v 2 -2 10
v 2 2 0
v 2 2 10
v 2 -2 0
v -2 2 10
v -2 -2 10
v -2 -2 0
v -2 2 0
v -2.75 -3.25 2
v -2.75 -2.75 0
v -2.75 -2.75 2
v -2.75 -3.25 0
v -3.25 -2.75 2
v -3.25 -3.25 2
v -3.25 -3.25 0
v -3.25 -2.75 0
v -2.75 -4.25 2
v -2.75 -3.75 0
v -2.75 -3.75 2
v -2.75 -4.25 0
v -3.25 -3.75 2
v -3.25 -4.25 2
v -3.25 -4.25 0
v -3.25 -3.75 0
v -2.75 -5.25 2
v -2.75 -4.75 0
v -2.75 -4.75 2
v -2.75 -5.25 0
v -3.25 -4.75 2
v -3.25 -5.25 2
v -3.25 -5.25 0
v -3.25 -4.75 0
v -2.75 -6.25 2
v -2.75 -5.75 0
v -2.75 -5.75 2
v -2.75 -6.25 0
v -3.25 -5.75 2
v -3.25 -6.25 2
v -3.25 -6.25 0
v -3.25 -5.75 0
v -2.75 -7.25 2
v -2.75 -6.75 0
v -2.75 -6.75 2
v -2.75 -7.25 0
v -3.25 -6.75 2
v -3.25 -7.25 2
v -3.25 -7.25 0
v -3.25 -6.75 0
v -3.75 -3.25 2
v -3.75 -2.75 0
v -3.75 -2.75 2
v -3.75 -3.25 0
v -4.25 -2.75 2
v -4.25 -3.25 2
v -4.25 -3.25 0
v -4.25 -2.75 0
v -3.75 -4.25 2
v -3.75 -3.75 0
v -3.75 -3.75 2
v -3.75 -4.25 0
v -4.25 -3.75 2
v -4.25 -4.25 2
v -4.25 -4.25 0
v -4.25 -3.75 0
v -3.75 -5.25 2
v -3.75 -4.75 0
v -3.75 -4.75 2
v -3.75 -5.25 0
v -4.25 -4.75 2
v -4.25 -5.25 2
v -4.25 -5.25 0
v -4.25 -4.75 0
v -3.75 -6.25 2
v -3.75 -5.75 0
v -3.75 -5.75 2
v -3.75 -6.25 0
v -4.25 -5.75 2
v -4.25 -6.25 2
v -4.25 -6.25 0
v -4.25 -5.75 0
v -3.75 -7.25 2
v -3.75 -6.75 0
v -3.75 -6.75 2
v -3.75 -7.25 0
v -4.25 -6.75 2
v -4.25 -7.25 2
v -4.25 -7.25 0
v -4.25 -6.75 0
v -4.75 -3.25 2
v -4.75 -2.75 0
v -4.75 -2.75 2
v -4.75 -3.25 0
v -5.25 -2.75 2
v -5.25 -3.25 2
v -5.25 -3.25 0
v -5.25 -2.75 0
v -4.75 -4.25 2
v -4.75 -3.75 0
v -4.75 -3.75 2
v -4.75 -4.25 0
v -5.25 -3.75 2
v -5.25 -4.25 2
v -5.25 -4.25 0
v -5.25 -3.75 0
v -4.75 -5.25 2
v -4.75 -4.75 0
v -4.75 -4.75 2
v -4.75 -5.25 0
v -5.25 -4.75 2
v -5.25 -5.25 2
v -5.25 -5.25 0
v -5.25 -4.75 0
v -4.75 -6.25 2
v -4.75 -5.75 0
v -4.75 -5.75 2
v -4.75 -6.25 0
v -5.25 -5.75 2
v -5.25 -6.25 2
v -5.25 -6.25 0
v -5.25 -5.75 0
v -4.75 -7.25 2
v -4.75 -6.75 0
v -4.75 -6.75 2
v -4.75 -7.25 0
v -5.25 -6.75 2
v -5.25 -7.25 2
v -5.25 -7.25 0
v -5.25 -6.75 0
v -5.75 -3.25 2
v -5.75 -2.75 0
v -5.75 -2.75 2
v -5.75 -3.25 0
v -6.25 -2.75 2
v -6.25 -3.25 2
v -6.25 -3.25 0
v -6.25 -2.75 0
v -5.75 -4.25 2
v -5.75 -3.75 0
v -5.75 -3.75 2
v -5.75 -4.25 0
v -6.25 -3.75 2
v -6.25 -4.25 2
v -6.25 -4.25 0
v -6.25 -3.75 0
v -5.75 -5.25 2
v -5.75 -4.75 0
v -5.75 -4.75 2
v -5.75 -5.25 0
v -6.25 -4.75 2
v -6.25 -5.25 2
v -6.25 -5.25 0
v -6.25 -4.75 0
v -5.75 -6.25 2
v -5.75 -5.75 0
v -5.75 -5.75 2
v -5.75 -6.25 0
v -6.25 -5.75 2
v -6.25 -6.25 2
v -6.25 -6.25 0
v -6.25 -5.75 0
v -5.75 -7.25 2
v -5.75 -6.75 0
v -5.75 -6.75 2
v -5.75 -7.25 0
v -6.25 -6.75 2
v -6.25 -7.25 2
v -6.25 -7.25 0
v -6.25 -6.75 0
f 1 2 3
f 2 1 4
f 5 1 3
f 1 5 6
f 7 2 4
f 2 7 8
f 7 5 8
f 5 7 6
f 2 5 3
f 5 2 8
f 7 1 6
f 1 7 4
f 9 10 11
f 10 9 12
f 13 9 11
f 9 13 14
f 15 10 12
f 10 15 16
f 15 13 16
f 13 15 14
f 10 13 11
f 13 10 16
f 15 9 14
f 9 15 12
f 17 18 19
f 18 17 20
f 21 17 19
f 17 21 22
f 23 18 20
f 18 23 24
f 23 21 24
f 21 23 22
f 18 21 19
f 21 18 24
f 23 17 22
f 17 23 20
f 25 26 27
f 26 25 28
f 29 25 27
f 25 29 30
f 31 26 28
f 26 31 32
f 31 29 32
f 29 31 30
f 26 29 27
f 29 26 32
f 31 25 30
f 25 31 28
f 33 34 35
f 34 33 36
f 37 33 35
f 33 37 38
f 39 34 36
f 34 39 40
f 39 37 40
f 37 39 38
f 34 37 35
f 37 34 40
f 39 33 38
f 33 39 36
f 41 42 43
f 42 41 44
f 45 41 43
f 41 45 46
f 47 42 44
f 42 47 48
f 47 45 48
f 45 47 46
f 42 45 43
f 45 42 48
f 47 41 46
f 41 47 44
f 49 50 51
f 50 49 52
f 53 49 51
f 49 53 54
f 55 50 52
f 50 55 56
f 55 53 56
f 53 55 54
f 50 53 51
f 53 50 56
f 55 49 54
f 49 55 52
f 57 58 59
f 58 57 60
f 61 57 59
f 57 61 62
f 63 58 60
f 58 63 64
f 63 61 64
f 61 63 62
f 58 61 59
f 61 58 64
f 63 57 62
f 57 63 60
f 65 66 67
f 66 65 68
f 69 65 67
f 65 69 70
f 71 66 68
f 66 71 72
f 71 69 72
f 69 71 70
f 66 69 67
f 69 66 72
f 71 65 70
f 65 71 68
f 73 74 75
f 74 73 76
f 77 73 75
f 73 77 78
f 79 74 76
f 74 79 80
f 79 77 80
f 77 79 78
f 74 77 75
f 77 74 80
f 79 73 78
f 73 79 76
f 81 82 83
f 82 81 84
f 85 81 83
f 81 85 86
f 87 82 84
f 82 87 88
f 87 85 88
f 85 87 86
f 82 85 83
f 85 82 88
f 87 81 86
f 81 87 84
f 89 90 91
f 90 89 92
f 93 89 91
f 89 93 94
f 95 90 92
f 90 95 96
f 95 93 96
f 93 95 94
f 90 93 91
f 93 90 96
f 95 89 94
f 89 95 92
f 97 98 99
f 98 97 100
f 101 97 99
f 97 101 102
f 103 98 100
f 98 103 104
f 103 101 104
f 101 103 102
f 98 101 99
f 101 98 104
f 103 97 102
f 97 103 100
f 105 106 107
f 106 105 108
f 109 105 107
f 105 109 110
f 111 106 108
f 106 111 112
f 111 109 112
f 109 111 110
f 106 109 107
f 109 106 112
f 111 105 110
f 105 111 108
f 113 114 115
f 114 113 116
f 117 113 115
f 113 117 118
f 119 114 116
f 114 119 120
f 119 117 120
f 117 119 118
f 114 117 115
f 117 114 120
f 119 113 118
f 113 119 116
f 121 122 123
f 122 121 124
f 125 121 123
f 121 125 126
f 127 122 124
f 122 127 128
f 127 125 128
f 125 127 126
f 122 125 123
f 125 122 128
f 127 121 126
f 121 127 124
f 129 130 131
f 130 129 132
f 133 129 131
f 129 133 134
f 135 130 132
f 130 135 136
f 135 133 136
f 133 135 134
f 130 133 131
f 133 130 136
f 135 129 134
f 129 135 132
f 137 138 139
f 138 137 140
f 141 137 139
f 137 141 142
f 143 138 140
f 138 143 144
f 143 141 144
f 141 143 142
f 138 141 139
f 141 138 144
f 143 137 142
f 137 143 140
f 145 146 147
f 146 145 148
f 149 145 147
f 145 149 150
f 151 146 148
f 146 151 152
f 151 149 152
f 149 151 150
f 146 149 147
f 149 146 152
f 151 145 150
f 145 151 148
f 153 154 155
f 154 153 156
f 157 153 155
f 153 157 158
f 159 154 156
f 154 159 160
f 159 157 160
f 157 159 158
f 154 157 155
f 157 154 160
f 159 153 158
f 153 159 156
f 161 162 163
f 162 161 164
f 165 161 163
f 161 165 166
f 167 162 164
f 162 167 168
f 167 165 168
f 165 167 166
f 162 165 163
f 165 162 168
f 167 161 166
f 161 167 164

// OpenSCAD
translate([0, 0, 5]) color([0,1,0,0.9]) cube([4, 4, 10], center=true);
translate([-3.0, -3.0, 1]) color([1,0,0]) cube([0.5, 0.5, 2], center=true);
translate([-3.0, -4.0, 1]) color([1,0,0]) cube([0.5, 0.5, 2], center=true);
translate([-3.0, -5.0, 1]) color([1,0,0]) cube([0.5, 0.5, 2], center=true);
translate([-3.0, -6.0, 1]) color([1,0,0]) cube([0.5, 0.5, 2], center=true);
translate([-3.0, -7.0, 1]) color([1,0,0]) cube([0.5, 0.5, 2], center=true);
translate([-4.0, -3.0, 1]) color([1,0,0]) cube([0.5, 0.5, 2], center=true);
translate([-4.0, -4.0, 1]) color([1,0,0]) cube([0.5, 0.5, 2], center=true);
translate([-4.0, -5.0, 1]) color([1,0,0]) cube([0.5, 0.5, 2], center=true);
translate([-4.0, -6.0, 1]) color([1,0,0]) cube([0.5, 0.5, 2], center=true);
translate([-4.0, -7.0, 1]) color([1,0,0]) cube([0.5, 0.5, 2], center=true);
translate([-5.0, -3.0, 1]) color([1,0,0]) cube([0.5, 0.5, 2], center=true);
translate([-5.0, -4.0, 1]) color([1,0,0]) cube([0.5, 0.5, 2], center=true);
translate([-5.0, -5.0, 1]) color([1,0,0]) cube([0.5, 0.5, 2], center=true);
translate([-5.0, -6.0, 1]) color([1,0,0]) cube([0.5, 0.5, 2], center=true);
translate([-5.0, -7.0, 1]) color([1,0,0]) cube([0.5, 0.5, 2], center=true);
translate([-6.0, -3.0, 1]) color([1,0,0]) cube([0.5, 0.5, 2], center=true);
translate([-6.0, -4.0, 1]) color([1,0,0]) cube([0.5, 0.5, 2], center=true);
translate([-6.0, -5.0, 1]) color([1,0,0]) cube([0.5, 0.5, 2], center=true);
translate([-6.0, -6.0, 1]) color([1,0,0]) cube([0.5, 0.5, 2], center=true);
translate([-6.0, -7.0, 1]) color([1,0,0]) cube([0.5, 0.5, 2], center=true);
